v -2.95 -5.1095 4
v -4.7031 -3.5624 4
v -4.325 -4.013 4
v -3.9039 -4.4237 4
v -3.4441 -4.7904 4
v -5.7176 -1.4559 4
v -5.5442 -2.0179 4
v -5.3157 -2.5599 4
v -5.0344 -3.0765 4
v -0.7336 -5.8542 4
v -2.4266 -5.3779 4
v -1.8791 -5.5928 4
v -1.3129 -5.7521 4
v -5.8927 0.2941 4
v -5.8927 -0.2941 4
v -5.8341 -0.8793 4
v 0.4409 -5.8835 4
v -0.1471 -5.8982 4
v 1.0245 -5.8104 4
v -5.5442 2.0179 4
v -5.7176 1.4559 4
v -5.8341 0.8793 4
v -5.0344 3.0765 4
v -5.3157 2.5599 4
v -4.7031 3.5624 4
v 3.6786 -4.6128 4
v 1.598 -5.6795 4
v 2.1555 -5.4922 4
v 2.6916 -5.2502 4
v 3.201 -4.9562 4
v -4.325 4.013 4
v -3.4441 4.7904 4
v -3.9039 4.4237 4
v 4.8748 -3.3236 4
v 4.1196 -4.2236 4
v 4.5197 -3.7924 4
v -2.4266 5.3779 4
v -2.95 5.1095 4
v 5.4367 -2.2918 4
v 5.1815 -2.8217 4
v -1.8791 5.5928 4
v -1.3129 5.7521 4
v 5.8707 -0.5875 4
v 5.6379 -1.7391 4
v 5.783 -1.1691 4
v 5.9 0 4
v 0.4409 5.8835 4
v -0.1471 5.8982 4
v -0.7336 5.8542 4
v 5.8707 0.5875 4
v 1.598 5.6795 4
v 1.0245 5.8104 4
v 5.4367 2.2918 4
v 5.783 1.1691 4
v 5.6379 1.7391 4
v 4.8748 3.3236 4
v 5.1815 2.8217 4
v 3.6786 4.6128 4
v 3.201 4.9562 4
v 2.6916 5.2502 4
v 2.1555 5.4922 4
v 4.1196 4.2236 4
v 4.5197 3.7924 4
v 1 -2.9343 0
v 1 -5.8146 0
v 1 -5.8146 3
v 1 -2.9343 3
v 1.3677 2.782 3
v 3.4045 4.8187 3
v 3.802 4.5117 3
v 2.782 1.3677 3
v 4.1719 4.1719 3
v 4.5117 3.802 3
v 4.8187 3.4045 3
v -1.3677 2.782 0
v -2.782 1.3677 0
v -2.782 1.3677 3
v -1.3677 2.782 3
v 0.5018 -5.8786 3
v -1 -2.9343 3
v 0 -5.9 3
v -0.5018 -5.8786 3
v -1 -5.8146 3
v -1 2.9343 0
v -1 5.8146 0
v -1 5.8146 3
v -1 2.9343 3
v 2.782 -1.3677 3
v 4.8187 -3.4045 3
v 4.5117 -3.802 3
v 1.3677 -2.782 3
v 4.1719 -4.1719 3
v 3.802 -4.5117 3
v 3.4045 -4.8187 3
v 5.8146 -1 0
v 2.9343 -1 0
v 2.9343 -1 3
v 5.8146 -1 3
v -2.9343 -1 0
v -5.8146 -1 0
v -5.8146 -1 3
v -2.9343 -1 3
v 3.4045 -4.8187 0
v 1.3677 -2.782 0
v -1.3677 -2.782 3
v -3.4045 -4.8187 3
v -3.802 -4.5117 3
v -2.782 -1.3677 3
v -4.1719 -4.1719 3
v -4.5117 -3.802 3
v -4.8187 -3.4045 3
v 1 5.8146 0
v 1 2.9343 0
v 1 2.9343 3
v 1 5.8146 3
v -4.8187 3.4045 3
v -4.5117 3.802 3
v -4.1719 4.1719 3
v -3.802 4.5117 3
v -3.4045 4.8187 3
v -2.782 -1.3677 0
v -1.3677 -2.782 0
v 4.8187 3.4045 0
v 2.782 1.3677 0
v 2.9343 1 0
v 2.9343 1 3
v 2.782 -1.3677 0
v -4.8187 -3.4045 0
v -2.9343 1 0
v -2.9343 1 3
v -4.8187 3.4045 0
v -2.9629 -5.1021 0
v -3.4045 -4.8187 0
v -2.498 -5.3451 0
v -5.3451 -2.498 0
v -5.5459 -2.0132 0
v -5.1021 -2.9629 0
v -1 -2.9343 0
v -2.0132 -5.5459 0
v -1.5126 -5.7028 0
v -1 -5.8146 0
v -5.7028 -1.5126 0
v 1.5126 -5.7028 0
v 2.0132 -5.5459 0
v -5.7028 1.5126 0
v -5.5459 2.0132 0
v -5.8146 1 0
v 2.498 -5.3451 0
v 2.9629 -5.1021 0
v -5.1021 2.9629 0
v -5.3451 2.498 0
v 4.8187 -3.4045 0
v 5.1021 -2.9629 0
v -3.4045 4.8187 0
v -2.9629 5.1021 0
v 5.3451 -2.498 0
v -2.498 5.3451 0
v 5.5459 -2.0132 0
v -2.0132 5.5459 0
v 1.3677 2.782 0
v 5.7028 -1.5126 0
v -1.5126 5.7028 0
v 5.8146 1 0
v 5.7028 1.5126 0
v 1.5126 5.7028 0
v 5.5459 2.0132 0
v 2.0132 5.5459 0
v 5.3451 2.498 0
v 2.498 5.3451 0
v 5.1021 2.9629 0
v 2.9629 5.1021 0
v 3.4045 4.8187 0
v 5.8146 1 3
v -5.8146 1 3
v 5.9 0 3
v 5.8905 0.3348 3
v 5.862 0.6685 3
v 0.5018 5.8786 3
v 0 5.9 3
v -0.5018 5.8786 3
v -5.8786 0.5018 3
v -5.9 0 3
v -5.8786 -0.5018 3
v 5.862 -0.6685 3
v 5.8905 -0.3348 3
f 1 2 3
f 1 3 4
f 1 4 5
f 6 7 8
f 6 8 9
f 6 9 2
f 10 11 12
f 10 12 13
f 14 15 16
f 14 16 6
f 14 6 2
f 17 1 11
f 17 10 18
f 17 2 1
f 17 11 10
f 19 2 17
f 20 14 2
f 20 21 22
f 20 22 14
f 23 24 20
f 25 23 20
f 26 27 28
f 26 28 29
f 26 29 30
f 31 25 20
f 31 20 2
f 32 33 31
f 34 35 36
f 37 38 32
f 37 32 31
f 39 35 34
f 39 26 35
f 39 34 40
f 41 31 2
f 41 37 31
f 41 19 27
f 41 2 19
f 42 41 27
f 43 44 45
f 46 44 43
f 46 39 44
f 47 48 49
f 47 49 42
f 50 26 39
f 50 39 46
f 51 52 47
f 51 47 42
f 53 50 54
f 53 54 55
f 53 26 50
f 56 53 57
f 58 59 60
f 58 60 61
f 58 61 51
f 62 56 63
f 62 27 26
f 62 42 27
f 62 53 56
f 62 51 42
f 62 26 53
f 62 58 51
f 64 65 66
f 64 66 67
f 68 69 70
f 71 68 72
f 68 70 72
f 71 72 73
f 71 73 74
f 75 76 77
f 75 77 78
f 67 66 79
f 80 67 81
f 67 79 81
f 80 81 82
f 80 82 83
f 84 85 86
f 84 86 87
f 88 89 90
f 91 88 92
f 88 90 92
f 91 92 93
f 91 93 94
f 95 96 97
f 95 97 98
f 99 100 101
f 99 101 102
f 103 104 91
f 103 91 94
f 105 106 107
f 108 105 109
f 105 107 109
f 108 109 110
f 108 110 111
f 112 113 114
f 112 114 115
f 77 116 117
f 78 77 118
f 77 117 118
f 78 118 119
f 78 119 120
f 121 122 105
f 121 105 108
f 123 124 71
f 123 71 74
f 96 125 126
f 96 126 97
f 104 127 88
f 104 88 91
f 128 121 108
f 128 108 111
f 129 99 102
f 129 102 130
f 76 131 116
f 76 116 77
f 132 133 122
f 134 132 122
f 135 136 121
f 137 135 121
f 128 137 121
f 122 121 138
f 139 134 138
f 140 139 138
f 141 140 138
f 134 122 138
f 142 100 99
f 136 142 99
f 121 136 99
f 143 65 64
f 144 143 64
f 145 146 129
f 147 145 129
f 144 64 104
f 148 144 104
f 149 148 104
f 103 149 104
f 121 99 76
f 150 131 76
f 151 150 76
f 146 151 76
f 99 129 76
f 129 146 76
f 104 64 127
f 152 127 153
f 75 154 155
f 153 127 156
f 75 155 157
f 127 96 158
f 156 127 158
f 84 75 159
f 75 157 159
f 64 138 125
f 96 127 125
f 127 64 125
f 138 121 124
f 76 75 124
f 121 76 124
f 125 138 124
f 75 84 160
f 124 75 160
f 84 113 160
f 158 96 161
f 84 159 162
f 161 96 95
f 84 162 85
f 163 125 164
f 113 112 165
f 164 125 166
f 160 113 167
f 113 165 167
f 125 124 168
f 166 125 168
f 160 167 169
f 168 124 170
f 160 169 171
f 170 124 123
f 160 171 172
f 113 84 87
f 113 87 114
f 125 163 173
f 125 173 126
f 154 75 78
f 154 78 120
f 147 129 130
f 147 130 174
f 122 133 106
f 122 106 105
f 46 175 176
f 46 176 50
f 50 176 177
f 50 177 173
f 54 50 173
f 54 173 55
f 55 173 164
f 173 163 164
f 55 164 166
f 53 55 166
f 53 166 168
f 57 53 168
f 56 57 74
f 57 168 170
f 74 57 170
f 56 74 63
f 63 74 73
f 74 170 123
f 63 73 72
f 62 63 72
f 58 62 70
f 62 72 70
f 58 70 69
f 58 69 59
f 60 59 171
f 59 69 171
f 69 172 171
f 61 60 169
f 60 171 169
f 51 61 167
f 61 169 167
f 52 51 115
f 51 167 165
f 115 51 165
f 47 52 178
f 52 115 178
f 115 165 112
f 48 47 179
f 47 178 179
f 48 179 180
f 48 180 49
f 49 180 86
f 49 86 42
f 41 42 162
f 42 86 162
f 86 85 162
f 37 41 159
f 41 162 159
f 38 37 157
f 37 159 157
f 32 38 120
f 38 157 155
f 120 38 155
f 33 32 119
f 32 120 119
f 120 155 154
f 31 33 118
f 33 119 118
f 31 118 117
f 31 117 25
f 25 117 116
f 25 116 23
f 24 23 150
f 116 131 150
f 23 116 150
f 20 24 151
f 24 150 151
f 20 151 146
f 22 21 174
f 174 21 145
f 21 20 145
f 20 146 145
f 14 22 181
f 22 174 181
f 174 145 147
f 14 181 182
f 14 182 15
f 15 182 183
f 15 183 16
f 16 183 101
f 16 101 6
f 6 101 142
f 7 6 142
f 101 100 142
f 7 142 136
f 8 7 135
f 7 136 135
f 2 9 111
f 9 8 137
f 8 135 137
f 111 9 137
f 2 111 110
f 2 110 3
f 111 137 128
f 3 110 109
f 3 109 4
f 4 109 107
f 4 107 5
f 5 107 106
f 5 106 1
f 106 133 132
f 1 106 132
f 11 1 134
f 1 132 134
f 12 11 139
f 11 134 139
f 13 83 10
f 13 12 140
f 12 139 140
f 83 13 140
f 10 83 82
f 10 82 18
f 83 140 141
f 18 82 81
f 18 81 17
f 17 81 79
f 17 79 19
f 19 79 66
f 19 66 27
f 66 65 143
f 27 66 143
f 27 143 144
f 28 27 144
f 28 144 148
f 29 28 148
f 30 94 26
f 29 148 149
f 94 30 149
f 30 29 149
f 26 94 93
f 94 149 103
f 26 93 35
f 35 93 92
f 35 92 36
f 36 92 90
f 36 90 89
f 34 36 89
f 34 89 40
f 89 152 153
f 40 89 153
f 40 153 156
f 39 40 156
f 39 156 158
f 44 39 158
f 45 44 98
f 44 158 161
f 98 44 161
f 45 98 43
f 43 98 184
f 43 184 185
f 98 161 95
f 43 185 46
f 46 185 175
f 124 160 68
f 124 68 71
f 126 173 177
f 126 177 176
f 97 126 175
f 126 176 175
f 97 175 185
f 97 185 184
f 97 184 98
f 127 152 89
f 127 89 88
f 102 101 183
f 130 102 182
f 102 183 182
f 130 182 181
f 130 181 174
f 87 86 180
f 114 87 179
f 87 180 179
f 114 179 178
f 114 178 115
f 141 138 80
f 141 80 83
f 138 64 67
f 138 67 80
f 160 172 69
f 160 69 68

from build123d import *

# Parameters (mm, degrees)
SKETCH1_R           = 5.9
BOSS_EXTRUDE1_DEPTH = 4
CUT_EXTRUDE2_DEPTH  = 3
CIRPATTERN1_COUNT   = 8


with BuildPart() as part:
    # Sketch1 → Boss-Extrude1 (new body)
    with BuildSketch(Plane.XY):
        Circle(SKETCH1_R)
    extrude(amount=BOSS_EXTRUDE1_DEPTH)

    # Sketch2 → Cut-Extrude2 (cut)
    with BuildSketch(Plane(origin=(0, 0, 0), x_dir=(-1, 0, 0), z_dir=(0, 0, -1))):
        with BuildLine():
            Line((1, 5.814636704), (1, 2.93428015))
            Line((1, 2.93428015), (-1, 2.93428015))
            Line((-1, 2.93428015), (-1, 5.814636704))
            ThreePointArc((-1, 5.814636704), (0, 5.9), (1, 5.814636704))
        make_face()
    cut_extrude2 = extrude(amount=-CUT_EXTRUDE2_DEPTH, mode=Mode.SUBTRACT)

    # CirPattern1: Cut-Extrude2 ×8 about axis
    cirpattern1_axis = Axis((0, 0, 0), (0, 0, 1))
    for i in range(1, CIRPATTERN1_COUNT):
        add(cut_extrude2.rotate(cirpattern1_axis, i * 360 / CIRPATTERN1_COUNT), mode=Mode.SUBTRACT)


solid = part.part
